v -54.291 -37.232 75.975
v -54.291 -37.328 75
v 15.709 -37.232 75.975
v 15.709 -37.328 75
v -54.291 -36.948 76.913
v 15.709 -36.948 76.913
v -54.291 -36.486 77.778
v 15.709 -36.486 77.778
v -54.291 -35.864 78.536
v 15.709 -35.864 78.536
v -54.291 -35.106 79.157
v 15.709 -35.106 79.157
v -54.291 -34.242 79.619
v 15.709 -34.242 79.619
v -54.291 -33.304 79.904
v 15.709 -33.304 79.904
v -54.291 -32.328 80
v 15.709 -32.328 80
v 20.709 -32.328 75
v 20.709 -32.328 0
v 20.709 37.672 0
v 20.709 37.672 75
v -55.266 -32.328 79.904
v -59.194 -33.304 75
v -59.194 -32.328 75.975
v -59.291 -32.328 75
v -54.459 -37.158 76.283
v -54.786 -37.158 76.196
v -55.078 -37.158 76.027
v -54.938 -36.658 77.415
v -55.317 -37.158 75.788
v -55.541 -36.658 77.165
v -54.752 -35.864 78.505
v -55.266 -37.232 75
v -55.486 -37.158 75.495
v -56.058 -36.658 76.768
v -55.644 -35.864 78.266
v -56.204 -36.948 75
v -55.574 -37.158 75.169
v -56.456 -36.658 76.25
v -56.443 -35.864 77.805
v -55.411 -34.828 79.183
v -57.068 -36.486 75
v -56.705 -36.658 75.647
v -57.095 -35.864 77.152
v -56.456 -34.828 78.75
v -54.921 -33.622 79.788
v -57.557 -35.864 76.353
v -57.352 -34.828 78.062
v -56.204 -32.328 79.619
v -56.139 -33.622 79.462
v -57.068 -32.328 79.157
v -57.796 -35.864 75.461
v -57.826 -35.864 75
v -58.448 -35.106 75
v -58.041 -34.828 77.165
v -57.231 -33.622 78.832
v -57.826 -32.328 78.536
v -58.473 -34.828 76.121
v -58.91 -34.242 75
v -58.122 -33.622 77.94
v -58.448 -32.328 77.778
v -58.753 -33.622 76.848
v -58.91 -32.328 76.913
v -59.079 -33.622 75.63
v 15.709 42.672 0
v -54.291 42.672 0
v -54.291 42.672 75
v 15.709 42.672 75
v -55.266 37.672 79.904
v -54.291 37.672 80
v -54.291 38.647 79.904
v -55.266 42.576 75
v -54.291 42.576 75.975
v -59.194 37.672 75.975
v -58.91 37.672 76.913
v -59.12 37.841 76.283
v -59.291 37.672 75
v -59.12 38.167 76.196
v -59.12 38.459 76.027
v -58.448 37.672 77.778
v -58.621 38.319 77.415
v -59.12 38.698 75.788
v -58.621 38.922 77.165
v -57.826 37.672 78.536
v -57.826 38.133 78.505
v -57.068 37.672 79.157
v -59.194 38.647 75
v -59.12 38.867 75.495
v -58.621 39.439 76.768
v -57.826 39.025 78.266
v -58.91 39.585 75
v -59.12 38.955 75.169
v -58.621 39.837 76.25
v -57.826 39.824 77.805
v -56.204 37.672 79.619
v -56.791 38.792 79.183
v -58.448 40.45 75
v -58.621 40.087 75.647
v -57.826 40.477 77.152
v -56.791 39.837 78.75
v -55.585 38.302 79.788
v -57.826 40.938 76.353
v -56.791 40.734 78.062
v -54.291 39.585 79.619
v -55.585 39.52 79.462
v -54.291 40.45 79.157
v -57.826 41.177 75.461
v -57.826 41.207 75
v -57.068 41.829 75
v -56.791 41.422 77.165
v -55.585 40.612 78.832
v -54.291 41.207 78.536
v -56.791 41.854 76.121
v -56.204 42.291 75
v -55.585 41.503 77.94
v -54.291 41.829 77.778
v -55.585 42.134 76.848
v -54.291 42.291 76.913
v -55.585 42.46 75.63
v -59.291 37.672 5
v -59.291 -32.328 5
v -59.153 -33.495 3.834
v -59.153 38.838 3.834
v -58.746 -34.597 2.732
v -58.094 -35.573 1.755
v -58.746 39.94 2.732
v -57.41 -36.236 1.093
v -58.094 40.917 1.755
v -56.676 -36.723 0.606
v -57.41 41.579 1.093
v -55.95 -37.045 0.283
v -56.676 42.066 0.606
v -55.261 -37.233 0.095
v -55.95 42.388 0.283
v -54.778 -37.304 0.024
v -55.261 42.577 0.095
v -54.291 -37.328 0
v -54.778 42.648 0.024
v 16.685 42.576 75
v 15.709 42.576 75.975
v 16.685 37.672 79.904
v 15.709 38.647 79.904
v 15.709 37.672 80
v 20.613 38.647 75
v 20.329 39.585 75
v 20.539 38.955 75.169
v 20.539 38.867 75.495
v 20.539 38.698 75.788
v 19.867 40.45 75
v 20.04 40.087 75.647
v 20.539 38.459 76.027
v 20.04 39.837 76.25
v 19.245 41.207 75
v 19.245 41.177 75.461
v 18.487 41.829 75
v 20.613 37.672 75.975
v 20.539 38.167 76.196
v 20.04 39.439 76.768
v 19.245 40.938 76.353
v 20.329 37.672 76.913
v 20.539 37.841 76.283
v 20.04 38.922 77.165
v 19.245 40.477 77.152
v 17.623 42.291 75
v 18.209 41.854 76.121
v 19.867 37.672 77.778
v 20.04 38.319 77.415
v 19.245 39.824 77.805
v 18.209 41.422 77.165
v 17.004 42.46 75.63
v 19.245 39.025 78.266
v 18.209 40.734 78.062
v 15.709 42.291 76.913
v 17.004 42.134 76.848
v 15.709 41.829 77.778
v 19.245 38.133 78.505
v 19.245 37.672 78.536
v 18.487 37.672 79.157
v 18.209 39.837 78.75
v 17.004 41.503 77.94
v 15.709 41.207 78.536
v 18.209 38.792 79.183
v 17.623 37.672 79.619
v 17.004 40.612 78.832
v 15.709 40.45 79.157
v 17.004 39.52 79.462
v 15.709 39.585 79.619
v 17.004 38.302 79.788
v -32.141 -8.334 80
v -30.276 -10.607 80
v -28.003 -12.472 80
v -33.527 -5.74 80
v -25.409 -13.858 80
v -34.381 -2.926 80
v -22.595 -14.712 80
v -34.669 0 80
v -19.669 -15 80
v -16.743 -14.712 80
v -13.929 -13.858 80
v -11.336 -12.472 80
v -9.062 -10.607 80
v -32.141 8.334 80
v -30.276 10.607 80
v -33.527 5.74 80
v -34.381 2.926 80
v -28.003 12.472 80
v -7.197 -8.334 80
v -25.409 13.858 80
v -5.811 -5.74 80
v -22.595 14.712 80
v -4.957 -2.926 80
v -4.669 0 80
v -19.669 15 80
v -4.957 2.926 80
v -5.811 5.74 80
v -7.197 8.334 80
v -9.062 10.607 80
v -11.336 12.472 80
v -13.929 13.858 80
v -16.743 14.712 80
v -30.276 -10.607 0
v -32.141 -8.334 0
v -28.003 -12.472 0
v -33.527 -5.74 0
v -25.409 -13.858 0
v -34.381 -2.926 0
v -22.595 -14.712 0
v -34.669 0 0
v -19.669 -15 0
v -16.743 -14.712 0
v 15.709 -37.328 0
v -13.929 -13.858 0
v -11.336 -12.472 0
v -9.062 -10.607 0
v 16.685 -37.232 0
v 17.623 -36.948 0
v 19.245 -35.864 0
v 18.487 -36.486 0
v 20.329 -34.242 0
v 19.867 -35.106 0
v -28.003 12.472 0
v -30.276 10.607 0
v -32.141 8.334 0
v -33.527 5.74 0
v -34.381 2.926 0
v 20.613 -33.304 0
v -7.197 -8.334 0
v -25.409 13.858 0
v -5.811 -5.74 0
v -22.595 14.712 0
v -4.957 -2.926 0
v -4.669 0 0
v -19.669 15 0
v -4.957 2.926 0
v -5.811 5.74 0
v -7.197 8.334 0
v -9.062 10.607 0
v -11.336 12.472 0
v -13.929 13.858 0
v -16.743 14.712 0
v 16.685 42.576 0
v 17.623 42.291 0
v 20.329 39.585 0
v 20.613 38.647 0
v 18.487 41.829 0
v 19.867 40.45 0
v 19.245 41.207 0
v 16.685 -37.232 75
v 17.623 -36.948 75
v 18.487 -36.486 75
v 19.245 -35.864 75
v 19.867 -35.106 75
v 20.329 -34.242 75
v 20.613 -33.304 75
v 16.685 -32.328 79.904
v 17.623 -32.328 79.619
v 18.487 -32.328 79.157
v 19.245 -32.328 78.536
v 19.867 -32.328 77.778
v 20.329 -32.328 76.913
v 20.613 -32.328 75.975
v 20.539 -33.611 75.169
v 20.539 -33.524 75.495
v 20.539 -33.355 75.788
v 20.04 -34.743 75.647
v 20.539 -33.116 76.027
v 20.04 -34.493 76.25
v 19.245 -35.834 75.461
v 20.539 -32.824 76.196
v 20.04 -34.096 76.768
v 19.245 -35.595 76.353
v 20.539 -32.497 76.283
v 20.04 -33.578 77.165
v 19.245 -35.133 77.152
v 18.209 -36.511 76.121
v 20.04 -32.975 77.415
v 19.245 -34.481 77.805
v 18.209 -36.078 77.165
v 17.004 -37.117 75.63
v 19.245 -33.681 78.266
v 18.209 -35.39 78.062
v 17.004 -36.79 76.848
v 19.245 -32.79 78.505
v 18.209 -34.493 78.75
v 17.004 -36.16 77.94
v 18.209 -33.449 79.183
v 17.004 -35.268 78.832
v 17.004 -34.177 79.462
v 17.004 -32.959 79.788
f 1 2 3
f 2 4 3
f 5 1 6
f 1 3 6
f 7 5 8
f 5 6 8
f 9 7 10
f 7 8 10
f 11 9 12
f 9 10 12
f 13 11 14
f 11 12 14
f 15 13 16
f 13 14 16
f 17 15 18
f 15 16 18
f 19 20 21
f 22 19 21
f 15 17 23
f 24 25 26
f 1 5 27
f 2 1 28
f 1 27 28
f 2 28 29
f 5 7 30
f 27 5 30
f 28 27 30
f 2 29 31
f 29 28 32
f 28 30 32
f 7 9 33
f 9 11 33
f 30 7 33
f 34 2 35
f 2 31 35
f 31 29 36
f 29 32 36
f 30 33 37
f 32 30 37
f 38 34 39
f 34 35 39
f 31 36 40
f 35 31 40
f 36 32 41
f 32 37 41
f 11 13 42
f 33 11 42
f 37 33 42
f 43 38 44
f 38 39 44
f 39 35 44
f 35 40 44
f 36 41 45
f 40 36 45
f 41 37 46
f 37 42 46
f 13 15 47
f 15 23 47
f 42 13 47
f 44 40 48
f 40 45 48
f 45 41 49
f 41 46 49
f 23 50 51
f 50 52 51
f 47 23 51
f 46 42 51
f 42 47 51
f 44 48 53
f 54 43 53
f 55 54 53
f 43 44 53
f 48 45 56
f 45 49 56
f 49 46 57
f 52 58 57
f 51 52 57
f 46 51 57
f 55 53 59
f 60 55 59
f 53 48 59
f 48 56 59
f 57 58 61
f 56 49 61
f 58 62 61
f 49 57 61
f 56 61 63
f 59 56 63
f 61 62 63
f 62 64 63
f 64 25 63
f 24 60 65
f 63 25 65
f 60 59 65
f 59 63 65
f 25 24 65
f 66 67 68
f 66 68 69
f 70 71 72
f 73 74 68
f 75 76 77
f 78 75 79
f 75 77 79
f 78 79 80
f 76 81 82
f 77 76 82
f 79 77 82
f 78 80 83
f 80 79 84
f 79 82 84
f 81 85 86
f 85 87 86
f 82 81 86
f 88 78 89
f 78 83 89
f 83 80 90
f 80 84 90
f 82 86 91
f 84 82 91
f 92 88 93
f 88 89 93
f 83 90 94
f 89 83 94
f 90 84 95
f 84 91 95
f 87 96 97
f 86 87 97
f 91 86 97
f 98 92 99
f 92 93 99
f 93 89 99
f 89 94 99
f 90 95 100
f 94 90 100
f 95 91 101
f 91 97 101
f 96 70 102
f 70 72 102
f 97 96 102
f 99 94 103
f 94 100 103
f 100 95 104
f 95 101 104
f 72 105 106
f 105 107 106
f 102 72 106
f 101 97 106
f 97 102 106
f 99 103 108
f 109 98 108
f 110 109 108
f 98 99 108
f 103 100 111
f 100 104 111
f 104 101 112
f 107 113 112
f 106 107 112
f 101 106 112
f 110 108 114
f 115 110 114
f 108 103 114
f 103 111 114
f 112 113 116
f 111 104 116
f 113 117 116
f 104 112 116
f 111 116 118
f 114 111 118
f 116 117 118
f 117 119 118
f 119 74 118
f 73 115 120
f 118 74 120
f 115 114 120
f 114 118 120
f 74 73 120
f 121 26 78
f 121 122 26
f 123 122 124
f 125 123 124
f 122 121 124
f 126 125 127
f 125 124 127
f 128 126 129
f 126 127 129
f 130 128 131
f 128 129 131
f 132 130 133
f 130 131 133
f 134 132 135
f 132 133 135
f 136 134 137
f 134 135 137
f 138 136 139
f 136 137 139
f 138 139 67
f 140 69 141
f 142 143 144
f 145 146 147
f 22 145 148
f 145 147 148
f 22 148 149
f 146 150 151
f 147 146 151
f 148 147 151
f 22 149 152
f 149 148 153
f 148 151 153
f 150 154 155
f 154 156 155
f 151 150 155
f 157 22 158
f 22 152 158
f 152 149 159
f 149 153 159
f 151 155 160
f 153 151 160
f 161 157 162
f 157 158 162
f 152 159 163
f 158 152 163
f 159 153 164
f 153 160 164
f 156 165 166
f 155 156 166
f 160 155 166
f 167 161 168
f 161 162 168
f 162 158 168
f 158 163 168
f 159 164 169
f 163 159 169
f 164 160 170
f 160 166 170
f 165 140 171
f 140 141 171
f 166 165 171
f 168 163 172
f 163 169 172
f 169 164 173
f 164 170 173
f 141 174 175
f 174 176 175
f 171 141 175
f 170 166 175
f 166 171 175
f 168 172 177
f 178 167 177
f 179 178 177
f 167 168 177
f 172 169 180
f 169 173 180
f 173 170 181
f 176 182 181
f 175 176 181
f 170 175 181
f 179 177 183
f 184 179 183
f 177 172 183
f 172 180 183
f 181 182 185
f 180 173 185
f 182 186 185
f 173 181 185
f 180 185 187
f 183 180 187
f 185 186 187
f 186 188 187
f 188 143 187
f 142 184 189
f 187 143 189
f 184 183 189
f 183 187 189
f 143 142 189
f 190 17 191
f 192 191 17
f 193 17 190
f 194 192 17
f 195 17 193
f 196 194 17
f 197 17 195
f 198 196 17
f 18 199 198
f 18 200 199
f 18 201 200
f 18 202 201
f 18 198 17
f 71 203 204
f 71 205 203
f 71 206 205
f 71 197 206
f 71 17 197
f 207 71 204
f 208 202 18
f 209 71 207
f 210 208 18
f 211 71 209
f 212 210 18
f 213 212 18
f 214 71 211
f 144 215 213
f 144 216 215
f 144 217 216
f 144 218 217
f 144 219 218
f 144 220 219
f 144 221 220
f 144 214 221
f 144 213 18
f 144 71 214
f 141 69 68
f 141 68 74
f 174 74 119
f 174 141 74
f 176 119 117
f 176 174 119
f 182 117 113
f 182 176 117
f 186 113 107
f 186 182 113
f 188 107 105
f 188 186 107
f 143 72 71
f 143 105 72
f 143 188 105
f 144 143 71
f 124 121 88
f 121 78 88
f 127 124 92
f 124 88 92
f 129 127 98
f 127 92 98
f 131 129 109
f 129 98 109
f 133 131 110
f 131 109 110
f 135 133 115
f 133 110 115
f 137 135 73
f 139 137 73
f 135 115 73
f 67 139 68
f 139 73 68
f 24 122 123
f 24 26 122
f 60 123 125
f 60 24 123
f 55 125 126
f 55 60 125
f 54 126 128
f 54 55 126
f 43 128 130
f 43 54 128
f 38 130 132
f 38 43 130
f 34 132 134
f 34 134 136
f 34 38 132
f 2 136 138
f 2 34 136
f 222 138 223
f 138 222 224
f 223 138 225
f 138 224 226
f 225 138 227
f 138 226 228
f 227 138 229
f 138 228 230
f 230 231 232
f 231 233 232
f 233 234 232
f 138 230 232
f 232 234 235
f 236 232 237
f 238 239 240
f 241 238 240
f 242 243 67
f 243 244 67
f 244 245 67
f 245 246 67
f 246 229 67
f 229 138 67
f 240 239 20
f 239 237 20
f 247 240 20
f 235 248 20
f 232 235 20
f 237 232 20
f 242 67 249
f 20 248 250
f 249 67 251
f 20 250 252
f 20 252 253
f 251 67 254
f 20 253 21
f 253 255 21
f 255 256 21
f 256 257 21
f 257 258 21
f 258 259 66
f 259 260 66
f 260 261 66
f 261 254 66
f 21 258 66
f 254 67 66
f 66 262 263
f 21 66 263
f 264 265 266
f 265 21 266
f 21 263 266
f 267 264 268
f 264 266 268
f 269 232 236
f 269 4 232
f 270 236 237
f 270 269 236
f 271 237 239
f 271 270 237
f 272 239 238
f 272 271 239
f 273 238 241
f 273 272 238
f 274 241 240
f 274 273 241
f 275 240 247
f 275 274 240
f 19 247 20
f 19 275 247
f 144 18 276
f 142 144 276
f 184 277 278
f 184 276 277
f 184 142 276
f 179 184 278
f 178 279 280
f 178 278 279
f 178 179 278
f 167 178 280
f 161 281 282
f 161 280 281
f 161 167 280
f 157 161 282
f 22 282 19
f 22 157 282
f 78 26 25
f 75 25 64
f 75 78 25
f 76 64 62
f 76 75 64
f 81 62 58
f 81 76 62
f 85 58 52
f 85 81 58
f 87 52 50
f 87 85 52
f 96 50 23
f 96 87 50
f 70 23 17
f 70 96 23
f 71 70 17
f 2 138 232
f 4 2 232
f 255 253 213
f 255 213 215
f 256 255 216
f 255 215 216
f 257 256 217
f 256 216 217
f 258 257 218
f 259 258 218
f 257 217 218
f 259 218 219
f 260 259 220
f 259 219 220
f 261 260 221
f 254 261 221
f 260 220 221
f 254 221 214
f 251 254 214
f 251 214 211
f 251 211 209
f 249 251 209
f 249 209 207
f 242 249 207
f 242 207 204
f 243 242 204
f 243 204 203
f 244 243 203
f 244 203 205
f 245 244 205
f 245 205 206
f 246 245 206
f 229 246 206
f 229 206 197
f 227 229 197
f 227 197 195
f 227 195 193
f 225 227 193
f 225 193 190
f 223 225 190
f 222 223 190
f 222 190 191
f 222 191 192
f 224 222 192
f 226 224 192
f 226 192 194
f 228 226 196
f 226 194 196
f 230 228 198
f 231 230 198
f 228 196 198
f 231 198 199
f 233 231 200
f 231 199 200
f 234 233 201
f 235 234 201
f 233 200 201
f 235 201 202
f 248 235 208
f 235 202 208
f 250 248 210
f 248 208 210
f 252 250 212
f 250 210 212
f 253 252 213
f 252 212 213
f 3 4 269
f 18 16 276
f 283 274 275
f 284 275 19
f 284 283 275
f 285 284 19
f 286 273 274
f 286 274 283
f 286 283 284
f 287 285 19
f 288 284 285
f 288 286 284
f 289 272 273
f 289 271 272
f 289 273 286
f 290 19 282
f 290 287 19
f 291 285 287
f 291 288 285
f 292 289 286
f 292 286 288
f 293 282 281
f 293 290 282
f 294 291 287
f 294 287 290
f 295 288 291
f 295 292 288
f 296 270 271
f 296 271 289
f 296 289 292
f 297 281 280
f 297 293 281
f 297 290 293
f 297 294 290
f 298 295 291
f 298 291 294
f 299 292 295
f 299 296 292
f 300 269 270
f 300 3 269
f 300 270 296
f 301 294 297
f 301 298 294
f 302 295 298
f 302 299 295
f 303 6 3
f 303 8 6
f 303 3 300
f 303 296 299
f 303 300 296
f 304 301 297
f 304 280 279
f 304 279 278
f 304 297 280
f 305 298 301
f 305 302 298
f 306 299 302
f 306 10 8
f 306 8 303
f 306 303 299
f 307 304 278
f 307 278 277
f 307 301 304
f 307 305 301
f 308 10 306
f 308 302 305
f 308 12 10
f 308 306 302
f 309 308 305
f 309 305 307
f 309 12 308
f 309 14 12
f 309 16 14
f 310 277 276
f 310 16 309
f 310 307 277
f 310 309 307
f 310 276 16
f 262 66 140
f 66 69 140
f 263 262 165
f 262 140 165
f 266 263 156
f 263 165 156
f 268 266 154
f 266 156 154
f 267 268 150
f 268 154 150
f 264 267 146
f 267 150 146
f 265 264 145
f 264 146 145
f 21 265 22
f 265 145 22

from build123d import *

# Parameters (mm, degrees)
F0_W     = 80
F0_H     = 80
F1_DEPTH = 80
F2_R     = 15
F3_DEPTH = 80.001
F4_R     = 5


with BuildPart() as f1:
    # F0 (on Top) → F1 (new body)
    with BuildSketch(Plane.XY):
        with Locations((-19.29054, 2.671687)):
            Rectangle(F0_W, F0_H)
    extrude(amount=F1_DEPTH)

    # F2 (on face) → F3 (cut, through all)
    with BuildSketch(Plane.XY.offset(80)):
        with Locations((-19.669065, 0)):
            Circle(F2_R)
    extrude(amount=-F3_DEPTH, mode=Mode.SUBTRACT)

    # F4
    f4_edges = [f1.edges().sort_by_distance(p)[0] for p in [
        (-19.29054, 42.671687, 80),
        (-59.29054, 2.671687, 80),
        (-19.29054, -37.328313, 80),
        (-59.29054, 42.671687, 40),
        (-59.29054, -37.328313, 40),
        (-59.29054, 2.671687, 0),
        (20.70946, 42.671687, 40),
        (20.70946, -37.328313, 40),
        (20.70946, 2.671687, 80),
    ]]
    fillet(f4_edges, radius=F4_R)


solid = f1.part
